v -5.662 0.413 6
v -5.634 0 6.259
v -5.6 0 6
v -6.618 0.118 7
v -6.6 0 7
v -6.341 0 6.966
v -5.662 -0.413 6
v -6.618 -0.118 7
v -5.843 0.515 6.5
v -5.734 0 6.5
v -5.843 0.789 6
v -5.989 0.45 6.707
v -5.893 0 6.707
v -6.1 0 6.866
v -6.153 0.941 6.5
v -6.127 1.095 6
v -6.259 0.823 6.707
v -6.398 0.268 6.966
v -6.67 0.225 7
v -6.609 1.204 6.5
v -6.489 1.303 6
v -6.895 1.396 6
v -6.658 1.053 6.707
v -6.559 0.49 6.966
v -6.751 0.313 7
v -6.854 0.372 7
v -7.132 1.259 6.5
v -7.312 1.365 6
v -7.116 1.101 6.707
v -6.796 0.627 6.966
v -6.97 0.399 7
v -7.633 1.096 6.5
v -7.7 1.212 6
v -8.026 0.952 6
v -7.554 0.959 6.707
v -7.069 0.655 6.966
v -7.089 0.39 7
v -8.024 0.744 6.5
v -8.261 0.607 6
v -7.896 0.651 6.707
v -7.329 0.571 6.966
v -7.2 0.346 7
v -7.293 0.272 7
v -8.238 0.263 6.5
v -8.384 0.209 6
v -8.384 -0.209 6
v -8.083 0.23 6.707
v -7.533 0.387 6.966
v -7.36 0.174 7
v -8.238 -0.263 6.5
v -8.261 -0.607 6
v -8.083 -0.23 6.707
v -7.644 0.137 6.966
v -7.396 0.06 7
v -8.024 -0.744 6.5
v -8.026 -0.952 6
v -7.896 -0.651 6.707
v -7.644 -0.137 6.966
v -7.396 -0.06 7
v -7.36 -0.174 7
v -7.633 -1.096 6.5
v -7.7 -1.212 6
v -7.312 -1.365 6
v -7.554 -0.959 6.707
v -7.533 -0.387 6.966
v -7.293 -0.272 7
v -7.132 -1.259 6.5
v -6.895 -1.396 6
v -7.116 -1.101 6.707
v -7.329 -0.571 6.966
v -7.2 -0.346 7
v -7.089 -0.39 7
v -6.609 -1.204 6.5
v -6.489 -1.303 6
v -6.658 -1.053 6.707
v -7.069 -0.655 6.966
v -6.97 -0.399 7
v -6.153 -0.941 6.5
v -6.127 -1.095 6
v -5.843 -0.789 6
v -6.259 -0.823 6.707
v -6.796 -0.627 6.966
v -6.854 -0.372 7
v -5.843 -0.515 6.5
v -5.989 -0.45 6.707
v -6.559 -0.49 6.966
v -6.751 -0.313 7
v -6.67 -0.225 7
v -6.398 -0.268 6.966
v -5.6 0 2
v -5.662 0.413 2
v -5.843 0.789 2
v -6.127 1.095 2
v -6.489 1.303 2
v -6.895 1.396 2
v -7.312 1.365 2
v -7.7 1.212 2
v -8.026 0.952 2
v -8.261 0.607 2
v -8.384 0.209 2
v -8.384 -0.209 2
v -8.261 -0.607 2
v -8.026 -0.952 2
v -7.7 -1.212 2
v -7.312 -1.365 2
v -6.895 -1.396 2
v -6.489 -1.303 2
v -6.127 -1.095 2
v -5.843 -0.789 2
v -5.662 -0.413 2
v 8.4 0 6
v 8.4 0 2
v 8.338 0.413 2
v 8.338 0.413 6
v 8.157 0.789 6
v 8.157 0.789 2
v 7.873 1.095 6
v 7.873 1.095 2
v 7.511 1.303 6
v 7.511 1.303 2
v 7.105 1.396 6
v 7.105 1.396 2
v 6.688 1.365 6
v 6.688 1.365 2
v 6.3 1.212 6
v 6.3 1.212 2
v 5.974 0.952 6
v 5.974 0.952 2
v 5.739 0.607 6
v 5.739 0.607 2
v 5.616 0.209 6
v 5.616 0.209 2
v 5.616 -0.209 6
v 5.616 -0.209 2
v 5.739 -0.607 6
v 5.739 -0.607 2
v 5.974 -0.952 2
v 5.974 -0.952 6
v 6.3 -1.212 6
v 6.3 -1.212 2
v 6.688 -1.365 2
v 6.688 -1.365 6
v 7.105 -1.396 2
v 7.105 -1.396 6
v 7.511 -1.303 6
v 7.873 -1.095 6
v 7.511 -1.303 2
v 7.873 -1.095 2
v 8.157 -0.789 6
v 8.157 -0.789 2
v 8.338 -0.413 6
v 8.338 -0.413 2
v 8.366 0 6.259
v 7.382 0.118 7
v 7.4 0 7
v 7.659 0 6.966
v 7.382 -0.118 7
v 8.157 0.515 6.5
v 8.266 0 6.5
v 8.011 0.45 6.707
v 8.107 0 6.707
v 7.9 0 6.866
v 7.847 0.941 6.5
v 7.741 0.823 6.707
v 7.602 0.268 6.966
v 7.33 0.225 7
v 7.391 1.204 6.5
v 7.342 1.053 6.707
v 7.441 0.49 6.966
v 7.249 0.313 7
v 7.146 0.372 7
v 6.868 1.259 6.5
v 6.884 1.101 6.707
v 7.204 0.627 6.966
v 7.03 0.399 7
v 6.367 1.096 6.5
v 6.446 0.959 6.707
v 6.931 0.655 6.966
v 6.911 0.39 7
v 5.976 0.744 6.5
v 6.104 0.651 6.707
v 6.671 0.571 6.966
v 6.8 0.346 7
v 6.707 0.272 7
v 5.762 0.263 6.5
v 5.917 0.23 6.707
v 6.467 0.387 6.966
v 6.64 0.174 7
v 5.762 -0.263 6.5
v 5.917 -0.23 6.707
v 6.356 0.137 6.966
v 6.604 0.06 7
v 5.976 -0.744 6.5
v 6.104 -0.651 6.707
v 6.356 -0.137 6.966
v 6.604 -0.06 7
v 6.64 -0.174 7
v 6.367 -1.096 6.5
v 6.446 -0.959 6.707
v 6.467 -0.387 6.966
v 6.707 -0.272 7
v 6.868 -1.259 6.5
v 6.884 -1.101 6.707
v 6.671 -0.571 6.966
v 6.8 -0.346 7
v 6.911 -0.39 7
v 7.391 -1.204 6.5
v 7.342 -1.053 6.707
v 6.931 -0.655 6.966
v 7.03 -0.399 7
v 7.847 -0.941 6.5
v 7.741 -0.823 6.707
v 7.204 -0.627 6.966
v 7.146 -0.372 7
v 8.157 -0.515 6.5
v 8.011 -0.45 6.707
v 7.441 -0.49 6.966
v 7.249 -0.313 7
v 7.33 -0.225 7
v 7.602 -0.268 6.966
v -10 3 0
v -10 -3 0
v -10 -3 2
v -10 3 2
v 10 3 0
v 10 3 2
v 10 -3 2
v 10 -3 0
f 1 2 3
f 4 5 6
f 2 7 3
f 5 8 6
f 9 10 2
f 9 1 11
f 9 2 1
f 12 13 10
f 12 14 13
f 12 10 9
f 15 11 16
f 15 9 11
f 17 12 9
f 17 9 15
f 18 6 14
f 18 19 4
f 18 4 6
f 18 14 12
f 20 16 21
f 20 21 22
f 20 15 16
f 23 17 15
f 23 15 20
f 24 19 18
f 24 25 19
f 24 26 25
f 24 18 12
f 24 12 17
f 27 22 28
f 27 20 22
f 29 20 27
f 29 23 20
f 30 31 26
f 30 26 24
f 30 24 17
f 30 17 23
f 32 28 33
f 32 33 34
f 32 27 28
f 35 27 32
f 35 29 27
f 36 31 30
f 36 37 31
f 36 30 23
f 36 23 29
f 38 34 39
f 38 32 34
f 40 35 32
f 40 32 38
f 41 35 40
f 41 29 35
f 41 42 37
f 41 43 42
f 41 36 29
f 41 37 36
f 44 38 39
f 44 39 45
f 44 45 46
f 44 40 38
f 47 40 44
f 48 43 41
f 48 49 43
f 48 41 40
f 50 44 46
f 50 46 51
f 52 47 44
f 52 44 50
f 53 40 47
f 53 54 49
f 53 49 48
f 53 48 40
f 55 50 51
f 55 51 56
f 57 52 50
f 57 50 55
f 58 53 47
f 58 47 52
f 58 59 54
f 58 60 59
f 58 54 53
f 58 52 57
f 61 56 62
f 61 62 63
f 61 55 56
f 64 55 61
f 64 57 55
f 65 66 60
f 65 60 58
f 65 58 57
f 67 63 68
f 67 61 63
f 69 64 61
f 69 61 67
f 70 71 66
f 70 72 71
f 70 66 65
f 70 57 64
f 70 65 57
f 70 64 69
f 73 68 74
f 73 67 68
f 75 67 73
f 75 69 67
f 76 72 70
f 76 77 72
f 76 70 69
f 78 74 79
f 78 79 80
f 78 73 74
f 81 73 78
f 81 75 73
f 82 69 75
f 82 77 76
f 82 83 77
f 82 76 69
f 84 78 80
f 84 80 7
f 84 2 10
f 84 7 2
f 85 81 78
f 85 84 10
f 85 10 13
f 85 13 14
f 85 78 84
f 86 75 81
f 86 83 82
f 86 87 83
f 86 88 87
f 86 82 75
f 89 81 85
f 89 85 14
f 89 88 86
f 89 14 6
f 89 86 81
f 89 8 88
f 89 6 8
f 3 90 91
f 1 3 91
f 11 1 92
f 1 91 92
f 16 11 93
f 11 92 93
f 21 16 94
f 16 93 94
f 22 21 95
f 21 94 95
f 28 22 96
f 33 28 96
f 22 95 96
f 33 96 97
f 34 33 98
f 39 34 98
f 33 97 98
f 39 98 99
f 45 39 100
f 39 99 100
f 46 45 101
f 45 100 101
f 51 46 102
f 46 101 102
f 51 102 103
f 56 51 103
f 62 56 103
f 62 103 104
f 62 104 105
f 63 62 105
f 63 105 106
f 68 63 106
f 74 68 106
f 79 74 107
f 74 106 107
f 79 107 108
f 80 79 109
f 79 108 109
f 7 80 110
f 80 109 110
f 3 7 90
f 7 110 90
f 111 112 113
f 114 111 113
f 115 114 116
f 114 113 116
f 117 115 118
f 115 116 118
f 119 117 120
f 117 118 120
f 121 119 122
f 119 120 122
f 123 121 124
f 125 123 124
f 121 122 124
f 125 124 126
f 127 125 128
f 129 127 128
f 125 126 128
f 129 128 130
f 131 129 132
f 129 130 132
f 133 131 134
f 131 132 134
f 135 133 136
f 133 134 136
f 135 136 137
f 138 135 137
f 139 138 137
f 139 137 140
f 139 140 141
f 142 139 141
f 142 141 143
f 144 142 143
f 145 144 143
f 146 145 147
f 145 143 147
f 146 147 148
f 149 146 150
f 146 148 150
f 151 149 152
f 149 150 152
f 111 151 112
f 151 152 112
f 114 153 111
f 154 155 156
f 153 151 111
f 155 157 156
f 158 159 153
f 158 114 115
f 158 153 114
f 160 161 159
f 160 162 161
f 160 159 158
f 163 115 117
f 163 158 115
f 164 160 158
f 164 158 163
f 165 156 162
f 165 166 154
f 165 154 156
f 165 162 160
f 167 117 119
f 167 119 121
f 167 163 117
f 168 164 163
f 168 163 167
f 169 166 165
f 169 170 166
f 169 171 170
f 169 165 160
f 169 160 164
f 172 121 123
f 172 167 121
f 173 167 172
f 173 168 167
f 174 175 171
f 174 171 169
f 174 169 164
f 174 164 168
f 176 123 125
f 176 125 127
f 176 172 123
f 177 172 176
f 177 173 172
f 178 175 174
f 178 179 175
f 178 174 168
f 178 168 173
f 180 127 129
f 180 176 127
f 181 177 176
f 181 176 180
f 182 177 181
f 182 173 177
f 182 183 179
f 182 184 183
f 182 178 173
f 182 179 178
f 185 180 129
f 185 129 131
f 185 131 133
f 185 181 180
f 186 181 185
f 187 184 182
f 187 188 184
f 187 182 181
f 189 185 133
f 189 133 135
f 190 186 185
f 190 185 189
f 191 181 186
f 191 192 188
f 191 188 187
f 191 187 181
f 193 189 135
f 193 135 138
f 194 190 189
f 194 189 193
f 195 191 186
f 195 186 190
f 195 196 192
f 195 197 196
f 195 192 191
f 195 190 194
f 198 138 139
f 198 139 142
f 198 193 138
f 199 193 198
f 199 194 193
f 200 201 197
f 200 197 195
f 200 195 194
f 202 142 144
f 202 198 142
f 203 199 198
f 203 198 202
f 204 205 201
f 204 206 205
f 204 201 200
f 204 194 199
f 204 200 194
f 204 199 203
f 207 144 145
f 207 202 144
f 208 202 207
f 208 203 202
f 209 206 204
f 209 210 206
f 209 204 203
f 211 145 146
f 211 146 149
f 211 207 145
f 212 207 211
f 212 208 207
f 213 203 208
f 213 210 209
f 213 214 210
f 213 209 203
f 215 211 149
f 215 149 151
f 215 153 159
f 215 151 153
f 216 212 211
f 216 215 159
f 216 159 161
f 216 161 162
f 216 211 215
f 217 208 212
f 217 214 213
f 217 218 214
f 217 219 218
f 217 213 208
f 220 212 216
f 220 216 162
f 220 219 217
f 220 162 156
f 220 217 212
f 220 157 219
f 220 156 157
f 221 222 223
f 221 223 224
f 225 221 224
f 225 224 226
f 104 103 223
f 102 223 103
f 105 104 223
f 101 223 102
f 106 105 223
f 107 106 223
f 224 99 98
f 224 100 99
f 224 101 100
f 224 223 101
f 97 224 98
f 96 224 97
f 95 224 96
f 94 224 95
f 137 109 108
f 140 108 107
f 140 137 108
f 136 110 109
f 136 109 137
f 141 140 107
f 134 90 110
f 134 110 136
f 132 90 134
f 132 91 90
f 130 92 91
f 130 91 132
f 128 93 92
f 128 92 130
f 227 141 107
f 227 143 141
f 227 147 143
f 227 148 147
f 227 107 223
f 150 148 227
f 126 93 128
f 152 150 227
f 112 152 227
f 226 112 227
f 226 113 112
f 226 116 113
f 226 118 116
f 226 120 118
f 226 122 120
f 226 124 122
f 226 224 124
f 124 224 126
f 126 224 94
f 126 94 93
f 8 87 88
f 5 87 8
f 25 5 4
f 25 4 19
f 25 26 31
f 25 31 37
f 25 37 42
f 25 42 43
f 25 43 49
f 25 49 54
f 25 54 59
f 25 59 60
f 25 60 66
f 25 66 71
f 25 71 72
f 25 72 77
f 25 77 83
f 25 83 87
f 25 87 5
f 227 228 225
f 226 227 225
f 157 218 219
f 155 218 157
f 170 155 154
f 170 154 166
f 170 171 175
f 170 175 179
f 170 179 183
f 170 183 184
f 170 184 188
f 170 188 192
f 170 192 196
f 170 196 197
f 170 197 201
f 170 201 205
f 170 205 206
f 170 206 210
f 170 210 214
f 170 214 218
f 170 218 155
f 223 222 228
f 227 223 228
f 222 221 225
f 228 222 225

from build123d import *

# Parameters (mm, degrees)
F0_W     = 20
F0_H     = 6
F1_DEPTH = 2
F2_R     = 1.4
F3_DEPTH = 5
F4_R     = 1


with BuildPart() as f1:
    # F0 (on Top) → F1 (new body)
    with BuildSketch(Plane.XY):
        Rectangle(F0_W, F0_H)
    extrude(amount=F1_DEPTH)

    # F2 (on face) → F3 (join)
    with BuildSketch(Plane.XY.offset(2)):
        with Locations((-7, 0)):
            Circle(F2_R)
        with Locations((7, 0)):
            Circle(F2_R)
    extrude(amount=F3_DEPTH)

    # F4
    f4_edges = [f1.edges().sort_by_distance(p)[0] for p in [
        (-8.4, 0, 7),
        (5.6, 0, 7),
    ]]
    fillet(f4_edges, radius=F4_R)


solid = f1.part
